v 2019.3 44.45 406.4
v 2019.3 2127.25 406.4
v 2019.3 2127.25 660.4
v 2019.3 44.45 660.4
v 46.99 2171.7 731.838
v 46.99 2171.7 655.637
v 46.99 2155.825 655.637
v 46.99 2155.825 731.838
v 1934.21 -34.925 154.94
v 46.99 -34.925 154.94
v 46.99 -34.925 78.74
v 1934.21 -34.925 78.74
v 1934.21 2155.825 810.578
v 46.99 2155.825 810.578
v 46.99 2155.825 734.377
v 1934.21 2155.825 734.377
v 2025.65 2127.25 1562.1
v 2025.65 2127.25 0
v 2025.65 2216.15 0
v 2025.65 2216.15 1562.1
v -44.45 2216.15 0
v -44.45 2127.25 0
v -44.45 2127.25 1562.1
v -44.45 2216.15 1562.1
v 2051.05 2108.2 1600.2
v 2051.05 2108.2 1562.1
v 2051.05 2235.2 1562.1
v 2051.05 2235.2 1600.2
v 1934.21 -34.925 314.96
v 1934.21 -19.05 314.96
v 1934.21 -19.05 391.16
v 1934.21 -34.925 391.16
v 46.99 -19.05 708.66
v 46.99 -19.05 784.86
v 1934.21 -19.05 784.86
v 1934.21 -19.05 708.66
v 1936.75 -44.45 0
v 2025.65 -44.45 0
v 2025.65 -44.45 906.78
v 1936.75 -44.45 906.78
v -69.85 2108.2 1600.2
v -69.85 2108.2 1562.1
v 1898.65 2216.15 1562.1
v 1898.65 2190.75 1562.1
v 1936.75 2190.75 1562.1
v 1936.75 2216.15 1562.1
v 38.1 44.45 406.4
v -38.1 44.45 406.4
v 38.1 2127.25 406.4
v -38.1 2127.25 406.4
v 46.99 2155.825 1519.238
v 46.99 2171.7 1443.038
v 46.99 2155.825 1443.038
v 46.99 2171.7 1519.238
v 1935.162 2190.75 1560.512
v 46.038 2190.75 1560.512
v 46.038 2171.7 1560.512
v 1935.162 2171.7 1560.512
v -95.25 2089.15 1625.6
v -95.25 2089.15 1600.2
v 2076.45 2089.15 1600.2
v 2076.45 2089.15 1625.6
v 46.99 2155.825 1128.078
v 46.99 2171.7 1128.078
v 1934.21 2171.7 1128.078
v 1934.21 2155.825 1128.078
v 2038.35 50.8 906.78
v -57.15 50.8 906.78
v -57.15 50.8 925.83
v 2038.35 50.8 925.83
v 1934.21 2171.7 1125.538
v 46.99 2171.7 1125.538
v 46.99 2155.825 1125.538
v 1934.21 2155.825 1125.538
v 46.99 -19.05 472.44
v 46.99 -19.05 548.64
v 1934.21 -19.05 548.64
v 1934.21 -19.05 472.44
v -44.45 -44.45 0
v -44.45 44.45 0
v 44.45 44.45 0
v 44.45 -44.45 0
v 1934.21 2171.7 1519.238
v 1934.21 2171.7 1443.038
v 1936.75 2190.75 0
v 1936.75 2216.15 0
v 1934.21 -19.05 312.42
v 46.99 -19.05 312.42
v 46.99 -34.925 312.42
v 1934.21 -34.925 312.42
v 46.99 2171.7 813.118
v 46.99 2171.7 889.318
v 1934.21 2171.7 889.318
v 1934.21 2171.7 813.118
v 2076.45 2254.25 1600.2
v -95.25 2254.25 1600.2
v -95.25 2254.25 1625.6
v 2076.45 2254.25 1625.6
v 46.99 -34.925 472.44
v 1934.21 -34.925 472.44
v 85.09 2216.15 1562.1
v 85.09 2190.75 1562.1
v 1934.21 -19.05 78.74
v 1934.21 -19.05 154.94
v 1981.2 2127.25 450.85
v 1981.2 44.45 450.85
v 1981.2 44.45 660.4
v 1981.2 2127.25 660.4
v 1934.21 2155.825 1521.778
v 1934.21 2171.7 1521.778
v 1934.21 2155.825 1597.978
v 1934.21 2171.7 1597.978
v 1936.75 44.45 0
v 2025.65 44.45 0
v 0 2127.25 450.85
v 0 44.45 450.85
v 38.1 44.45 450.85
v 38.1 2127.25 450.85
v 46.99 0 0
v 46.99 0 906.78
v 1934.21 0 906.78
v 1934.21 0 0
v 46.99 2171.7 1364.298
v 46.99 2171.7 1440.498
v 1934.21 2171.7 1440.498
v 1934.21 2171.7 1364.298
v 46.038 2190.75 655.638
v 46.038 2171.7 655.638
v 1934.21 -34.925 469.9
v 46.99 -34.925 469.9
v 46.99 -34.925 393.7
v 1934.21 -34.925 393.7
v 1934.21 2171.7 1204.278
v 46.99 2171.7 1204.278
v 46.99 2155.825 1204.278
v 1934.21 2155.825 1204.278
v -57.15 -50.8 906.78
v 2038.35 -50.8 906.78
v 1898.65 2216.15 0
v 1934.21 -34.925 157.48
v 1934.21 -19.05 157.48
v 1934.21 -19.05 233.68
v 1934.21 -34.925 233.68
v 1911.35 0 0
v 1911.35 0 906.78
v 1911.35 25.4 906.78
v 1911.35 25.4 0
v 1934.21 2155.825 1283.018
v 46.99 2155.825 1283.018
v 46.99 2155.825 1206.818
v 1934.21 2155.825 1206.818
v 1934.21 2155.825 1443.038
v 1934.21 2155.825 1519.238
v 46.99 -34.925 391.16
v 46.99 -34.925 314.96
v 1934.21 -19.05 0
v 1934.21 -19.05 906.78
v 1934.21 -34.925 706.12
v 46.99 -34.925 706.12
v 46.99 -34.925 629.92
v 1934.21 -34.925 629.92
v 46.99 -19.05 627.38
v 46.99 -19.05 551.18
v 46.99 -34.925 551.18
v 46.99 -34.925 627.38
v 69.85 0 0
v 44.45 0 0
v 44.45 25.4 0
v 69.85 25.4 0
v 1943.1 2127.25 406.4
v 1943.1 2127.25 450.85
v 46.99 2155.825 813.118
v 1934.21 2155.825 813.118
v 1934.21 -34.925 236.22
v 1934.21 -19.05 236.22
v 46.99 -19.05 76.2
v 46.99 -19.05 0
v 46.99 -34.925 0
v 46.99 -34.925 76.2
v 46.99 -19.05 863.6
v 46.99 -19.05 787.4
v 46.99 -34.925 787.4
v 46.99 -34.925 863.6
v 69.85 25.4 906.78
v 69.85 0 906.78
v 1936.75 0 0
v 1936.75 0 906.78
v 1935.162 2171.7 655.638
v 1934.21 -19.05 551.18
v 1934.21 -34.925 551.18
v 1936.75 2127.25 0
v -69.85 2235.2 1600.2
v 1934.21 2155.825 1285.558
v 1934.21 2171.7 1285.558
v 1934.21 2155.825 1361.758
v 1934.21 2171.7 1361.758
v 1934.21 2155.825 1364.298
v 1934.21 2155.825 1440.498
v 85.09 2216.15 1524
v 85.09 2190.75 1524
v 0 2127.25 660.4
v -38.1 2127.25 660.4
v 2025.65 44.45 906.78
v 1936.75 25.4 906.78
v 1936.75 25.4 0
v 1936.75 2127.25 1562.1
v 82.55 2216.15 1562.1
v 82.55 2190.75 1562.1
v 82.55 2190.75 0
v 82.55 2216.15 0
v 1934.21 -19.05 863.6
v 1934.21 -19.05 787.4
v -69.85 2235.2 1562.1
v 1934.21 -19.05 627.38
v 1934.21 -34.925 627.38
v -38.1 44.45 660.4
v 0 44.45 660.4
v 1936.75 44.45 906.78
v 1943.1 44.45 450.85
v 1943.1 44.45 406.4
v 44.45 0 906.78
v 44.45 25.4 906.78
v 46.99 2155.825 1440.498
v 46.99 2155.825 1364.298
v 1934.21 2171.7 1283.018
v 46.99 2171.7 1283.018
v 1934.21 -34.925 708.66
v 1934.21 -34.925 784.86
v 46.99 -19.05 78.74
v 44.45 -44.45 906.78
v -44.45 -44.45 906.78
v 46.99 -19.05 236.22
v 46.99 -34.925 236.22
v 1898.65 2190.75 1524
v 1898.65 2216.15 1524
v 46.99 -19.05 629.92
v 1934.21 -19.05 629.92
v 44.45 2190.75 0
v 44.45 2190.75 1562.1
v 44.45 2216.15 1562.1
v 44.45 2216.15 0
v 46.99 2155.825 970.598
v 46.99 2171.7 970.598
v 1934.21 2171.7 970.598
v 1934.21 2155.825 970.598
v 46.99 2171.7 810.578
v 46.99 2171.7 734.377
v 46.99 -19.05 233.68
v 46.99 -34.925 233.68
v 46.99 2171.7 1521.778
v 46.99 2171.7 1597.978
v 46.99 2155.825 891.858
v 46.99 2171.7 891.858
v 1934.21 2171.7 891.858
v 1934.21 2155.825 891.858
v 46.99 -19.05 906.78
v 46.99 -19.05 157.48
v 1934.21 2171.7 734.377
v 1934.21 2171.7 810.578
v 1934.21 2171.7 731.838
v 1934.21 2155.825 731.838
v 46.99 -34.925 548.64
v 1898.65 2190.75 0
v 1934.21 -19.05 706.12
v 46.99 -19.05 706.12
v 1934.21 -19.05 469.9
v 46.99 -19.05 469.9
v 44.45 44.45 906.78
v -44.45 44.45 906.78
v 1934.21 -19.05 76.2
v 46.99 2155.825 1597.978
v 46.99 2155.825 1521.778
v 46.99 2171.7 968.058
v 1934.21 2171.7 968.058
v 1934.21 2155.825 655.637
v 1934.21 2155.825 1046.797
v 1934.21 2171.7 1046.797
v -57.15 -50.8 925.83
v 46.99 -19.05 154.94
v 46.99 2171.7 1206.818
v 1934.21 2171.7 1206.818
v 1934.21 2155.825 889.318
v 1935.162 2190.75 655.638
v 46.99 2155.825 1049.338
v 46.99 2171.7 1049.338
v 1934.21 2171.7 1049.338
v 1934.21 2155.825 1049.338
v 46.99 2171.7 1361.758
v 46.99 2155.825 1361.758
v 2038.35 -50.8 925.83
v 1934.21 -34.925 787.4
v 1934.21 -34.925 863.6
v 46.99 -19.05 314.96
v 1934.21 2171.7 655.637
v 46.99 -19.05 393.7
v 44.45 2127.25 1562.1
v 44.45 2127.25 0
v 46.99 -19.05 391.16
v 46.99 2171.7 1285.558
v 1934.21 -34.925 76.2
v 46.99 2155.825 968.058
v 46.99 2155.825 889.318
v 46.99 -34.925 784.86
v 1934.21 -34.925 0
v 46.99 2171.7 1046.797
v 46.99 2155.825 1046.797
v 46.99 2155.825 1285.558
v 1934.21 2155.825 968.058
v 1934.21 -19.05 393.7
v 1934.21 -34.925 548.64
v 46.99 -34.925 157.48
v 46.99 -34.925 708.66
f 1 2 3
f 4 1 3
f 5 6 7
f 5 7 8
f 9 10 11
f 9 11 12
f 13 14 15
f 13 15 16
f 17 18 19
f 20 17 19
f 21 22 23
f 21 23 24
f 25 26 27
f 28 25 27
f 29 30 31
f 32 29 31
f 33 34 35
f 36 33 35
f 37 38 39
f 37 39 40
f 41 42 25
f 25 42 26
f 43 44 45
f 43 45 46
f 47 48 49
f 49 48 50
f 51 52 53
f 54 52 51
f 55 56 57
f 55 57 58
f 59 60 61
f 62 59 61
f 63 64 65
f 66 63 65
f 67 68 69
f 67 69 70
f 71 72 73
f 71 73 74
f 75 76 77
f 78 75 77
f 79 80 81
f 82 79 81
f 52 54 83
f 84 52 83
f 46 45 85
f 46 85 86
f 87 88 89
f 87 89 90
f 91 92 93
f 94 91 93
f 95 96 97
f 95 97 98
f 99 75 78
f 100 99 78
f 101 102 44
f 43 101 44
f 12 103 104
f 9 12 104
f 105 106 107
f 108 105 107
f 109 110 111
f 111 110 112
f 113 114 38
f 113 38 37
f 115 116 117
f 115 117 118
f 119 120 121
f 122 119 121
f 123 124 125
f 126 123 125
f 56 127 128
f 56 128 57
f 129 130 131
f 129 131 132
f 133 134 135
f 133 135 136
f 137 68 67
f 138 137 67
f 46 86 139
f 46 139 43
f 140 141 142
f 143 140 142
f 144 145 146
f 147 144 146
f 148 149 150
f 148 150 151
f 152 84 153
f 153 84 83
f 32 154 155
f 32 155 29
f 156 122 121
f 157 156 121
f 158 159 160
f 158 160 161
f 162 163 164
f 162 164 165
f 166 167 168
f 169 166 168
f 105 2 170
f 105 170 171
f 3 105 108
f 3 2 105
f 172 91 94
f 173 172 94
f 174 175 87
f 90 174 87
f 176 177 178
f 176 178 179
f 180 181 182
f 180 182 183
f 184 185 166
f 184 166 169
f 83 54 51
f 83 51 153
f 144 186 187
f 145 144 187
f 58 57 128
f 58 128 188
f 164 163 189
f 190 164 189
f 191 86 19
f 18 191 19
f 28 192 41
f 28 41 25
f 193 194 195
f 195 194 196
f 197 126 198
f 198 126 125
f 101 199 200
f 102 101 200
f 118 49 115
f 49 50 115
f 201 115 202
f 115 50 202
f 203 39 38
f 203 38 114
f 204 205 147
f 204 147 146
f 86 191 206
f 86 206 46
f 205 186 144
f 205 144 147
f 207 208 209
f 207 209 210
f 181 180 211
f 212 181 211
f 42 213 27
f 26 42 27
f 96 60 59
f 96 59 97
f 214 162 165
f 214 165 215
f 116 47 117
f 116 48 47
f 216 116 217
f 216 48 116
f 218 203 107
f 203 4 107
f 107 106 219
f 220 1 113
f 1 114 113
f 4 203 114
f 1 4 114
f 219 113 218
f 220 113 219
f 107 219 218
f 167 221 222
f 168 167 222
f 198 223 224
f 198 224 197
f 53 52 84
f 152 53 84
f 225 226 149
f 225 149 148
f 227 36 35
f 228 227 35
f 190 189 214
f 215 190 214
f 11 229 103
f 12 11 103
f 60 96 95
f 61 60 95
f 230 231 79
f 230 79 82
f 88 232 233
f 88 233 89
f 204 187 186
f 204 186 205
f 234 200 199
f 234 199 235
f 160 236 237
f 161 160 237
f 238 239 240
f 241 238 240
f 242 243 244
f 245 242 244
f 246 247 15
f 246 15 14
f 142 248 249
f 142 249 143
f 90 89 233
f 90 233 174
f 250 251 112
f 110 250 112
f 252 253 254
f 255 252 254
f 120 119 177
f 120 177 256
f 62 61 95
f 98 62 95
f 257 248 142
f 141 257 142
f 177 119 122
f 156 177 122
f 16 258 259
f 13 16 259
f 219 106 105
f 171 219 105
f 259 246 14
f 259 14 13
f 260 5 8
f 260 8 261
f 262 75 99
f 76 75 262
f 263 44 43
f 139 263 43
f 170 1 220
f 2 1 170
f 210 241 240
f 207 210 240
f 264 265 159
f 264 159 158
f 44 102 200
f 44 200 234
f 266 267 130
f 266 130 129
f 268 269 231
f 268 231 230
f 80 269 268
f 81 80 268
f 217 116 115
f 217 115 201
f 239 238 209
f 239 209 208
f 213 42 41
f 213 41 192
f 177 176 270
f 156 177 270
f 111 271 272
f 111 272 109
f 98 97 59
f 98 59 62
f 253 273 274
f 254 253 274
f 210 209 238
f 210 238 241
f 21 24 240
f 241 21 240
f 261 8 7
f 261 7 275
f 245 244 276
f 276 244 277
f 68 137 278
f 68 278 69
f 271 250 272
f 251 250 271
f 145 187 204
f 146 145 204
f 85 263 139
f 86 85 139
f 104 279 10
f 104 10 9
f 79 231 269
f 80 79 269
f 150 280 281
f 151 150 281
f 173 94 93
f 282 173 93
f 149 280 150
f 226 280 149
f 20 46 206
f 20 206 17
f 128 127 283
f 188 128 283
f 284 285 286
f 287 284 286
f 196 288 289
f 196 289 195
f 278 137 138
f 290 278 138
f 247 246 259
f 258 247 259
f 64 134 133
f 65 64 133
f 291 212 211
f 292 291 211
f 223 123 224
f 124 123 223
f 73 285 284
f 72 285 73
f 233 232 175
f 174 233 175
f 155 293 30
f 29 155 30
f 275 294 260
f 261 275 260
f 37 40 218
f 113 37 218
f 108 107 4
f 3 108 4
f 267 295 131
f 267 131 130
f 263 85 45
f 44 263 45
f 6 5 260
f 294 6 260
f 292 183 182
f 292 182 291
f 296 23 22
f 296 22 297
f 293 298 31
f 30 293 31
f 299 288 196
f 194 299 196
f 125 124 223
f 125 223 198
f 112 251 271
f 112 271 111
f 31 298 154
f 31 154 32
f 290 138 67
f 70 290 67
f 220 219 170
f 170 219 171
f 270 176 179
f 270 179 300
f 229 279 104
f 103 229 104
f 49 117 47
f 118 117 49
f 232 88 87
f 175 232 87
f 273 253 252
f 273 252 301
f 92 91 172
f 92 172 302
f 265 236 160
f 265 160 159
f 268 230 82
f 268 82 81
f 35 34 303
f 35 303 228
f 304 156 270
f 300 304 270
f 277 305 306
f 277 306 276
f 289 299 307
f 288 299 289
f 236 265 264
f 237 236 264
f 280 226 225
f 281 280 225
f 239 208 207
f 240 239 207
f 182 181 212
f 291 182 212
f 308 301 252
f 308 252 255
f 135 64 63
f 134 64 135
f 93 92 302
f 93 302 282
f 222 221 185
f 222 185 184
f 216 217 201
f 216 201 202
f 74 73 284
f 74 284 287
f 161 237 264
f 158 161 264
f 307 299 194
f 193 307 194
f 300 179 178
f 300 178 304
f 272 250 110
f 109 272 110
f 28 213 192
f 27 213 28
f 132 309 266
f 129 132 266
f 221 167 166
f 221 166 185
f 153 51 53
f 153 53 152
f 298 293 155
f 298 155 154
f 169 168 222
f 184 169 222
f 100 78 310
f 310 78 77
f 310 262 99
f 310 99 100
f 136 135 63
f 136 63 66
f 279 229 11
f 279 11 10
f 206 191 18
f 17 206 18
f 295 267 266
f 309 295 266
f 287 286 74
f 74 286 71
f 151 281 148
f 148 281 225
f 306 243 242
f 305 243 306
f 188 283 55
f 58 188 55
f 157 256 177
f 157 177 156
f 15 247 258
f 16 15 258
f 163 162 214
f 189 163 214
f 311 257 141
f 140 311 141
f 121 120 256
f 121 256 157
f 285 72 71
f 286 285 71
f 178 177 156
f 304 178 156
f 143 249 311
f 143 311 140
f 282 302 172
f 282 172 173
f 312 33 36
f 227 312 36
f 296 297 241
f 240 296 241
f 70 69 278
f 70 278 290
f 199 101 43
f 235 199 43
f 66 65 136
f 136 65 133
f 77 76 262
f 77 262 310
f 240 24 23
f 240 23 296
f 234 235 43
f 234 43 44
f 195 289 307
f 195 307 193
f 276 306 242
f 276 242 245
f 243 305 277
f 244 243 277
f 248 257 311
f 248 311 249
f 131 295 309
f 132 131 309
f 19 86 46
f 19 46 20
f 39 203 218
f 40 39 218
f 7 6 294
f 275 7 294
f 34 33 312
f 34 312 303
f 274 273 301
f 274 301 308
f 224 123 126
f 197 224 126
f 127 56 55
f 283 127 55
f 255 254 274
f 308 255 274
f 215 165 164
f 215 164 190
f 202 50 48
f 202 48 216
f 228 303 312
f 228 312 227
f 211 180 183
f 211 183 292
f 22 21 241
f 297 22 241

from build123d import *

# Parameters (mm, degrees)
F0_W      = 88.9
F0_H      = 88.9
F1_DEPTH  = 906.78
F2_W      = 25.4
F2_H      = 906.78
F3_DEPTH  = 25.4
F6_W      = 2095.5
F6_H      = 101.6
F7_DEPTH  = 19.05
F8_W      = 1887.22
F8_H      = 906.78
F9_DEPTH  = 19.05
F10_W     = 1887.22
F10_H     = 76.2
F11_DEPTH = 15.875
F12_W     = 38.1
F12_H     = 254
F13_DEPTH = 2082.8
F14_W     = 2082.8
F14_H     = 44.45
F15_DEPTH = 38.1
F17_W     = 88.9
F17_H     = 88.9
F18_DEPTH = 1562.1
F19_W     = 25.4
F19_H     = 1562.1
F20_DEPTH = 38.1
F22_W     = 2120.9
F22_H     = 127
F23_DEPTH = 38.1
F24_W     = 1813.56
F24_H     = 25.4
F25_DEPTH = 38.1
F26_W     = 1889.125
F26_H     = 904.875
F27_DEPTH = 19.05
F28_W     = 1887.22
F28_H     = 76.2
F29_DEPTH = 15.875
F30_W     = 2171.7
F30_H     = 165.1
F31_DEPTH = 25.4


with BuildPart() as f1:
    # F0 (on Top) → F1 (new body)
    with BuildSketch(Plane.XY):
        Rectangle(F0_W, F0_H)
    extrude(amount=F1_DEPTH)


with BuildPart() as f3:
    # F2 (on face) → F3 (new body)
    with BuildSketch(Plane.YZ.offset(44.45)):
        with Locations((12.7, 453.39)):
            Rectangle(F2_W, F2_H)
    extrude(amount=F3_DEPTH)


with BuildPart() as f5_1:
    # F5: instance of F1
    add(f1.part.mirror(Plane.YZ.offset(990.6)))



with BuildPart() as f5_2:
    # F5: instance of F3
    add(f3.part.mirror(Plane.YZ.offset(990.6)))


with BuildPart() as f7:
    # F6 (on face) → F7 (new body)
    with BuildSketch(Plane.XY.offset(906.78)):
        with Locations((990.6, 0)):
            Rectangle(F6_W, F6_H)
    extrude(amount=F7_DEPTH)


with BuildPart() as f9:
    # F8 (on face) → F9 (new body)
    with BuildSketch(Plane.XZ):
        with Locations((990.6, 453.39)):
            Rectangle(F8_W, F8_H)
    extrude(amount=F9_DEPTH)


with BuildPart() as f11:
    # F10 (on face) → F11 (new body)
    with BuildSketch(Plane.XZ.offset(19.05)):
        with Locations((990.6, 38.1)):
            Rectangle(F10_W, F10_H)
    extrude(amount=F11_DEPTH)


with BuildPart() as f11b:
    # F10 (on face) → F11, piece 2 (new body)
    with BuildSketch(Plane.XZ.offset(19.05)):
        with Locations((990.6, 116.84)):
            Rectangle(F10_W, F10_H)
    extrude(amount=F11_DEPTH)


with BuildPart() as f11c:
    # F10 (on face) → F11, piece 3 (new body)
    with BuildSketch(Plane.XZ.offset(19.05)):
        with Locations((990.6, 195.58)):
            Rectangle(F10_W, F10_H)
    extrude(amount=F11_DEPTH)


with BuildPart() as f11d:
    # F10 (on face) → F11, piece 4 (new body)
    with BuildSketch(Plane.XZ.offset(19.05)):
        with Locations((990.6, 274.32)):
            Rectangle(F10_W, F10_H)
    extrude(amount=F11_DEPTH)


with BuildPart() as f11e:
    # F10 (on face) → F11, piece 5 (new body)
    with BuildSketch(Plane.XZ.offset(19.05)):
        with Locations((990.6, 353.06)):
            Rectangle(F10_W, F10_H)
    extrude(amount=F11_DEPTH)


with BuildPart() as f11f:
    # F10 (on face) → F11, piece 6 (new body)
    with BuildSketch(Plane.XZ.offset(19.05)):
        with Locations((990.6, 431.8)):
            Rectangle(F10_W, F10_H)
    extrude(amount=F11_DEPTH)


with BuildPart() as f11g:
    # F10 (on face) → F11, piece 7 (new body)
    with BuildSketch(Plane.XZ.offset(19.05)):
        with Locations((990.6, 510.54)):
            Rectangle(F10_W, F10_H)
    extrude(amount=F11_DEPTH)


with BuildPart() as f11h:
    # F10 (on face) → F11, piece 8 (new body)
    with BuildSketch(Plane.XZ.offset(19.05)):
        with Locations((990.6, 589.28)):
            Rectangle(F10_W, F10_H)
    extrude(amount=F11_DEPTH)


with BuildPart() as f11i:
    # F10 (on face) → F11, piece 9 (new body)
    with BuildSketch(Plane.XZ.offset(19.05)):
        with Locations((990.6, 668.02)):
            Rectangle(F10_W, F10_H)
    extrude(amount=F11_DEPTH)


with BuildPart() as f11j:
    # F10 (on face) → F11, piece 10 (new body)
    with BuildSketch(Plane.XZ.offset(19.05)):
        with Locations((990.6, 746.76)):
            Rectangle(F10_W, F10_H)
    extrude(amount=F11_DEPTH)


with BuildPart() as f11k:
    # F10 (on face) → F11, piece 11 (new body)
    with BuildSketch(Plane.XZ.offset(19.05)):
        with Locations((990.6, 825.5)):
            Rectangle(F10_W, F10_H)
    extrude(amount=F11_DEPTH)


with BuildPart() as f13:
    # F12 (on face) → F13 (new body)
    with BuildSketch(Plane(origin=(0, 44.45, 0), x_dir=(-1, 0, 0), z_dir=(0, 1, 0))):
        with Locations((19.05, 533.4)):
            Rectangle(F12_W, F12_H)
    extrude(amount=F13_DEPTH)


with BuildPart() as f15:
    # F14 (on face) → F15 (new body)
    with BuildSketch(Plane.YZ):
        with Locations((1085.85, 428.625)):
            Rectangle(F14_W, F14_H)
    extrude(amount=F15_DEPTH)


with BuildPart() as f5_1_1:
    add(f5_1.part)

    add(f13.part)  # F16 merges F13

    add(f15.part)  # F16 merges F15
    # F16: F13, F15 across plane
    add(f13.part.mirror(Plane.YZ.offset(990.6)))
    add(f15.part.mirror(Plane.YZ.offset(990.6)))


with BuildPart() as f18:
    # F17 (on Top) → F18 (new body)
    with BuildSketch(Plane.XY):
        with Locations((0, 2171.7)):
            Rectangle(F17_W, F17_H)
    extrude(amount=F18_DEPTH)


with BuildPart() as f18b:
    # F17 (on Top) → F18, piece 2 (new body)
    with BuildSketch(Plane.XY):
        with Locations((1981.2, 2171.7)):
            Rectangle(F17_W, F17_H)
    extrude(amount=F18_DEPTH)


with BuildPart() as f20:
    # F19 (on face) → F20 (new body)
    with BuildSketch(Plane.YZ.offset(44.45)):
        with Locations((2203.45, 781.05)):
            Rectangle(F19_W, F19_H)
    extrude(amount=F20_DEPTH)


with BuildPart() as f21_1:
    # F21: instance of F20
    add(f20.part.mirror(Plane.YZ.offset(990.6)))


with BuildPart() as f23:
    # F22 (on face) → F23 (new body)
    with BuildSketch(Plane.XY.offset(1562.1)):
        with Locations((990.6, 2171.7)):
            Rectangle(F22_W, F22_H)
    extrude(amount=F23_DEPTH)


with BuildPart() as f25:
    # F24 (on face) → F25 (new body)
    with BuildSketch(Plane(origin=(0, 0, 1562.1), x_dir=(1, 0, 0), z_dir=(0, 0, -1))):
        with Locations((991.87, -2203.45)):
            Rectangle(F24_W, F24_H)
    extrude(amount=F25_DEPTH)


with BuildPart() as f27:
    # F26 (on face) → F27 (new body)
    with BuildSketch(Plane.XZ.offset(-2190.75)):
        with Locations((990.6, 1108.075)):
            Rectangle(F26_W, F26_H)
    extrude(amount=F27_DEPTH)


with BuildPart() as f29:
    # F28 (on face) → F29 (new body)
    with BuildSketch(Plane.XZ.offset(-2171.7)):
        with Locations((990.6, 693.7375)):
            Rectangle(F28_W, F28_H)
    extrude(amount=F29_DEPTH)


with BuildPart() as f29b:
    # F28 (on face) → F29, piece 2 (new body)
    with BuildSketch(Plane.XZ.offset(-2171.7)):
        with Locations((990.6, 772.4775)):
            Rectangle(F28_W, F28_H)
    extrude(amount=F29_DEPTH)


with BuildPart() as f29c:
    # F28 (on face) → F29, piece 3 (new body)
    with BuildSketch(Plane.XZ.offset(-2171.7)):
        with Locations((990.6, 851.2175)):
            Rectangle(F28_W, F28_H)
    extrude(amount=F29_DEPTH)


with BuildPart() as f29d:
    # F28 (on face) → F29, piece 4 (new body)
    with BuildSketch(Plane.XZ.offset(-2171.7)):
        with Locations((990.6, 929.9575)):
            Rectangle(F28_W, F28_H)
    extrude(amount=F29_DEPTH)


with BuildPart() as f29e:
    # F28 (on face) → F29, piece 5 (new body)
    with BuildSketch(Plane.XZ.offset(-2171.7)):
        with Locations((990.6, 1008.6975)):
            Rectangle(F28_W, F28_H)
    extrude(amount=F29_DEPTH)


with BuildPart() as f29f:
    # F28 (on face) → F29, piece 6 (new body)
    with BuildSketch(Plane.XZ.offset(-2171.7)):
        with Locations((990.6, 1087.4375)):
            Rectangle(F28_W, F28_H)
    extrude(amount=F29_DEPTH)


with BuildPart() as f29g:
    # F28 (on face) → F29, piece 7 (new body)
    with BuildSketch(Plane.XZ.offset(-2171.7)):
        with Locations((990.6, 1166.1775)):
            Rectangle(F28_W, F28_H)
    extrude(amount=F29_DEPTH)


with BuildPart() as f29h:
    # F28 (on face) → F29, piece 8 (new body)
    with BuildSketch(Plane.XZ.offset(-2171.7)):
        with Locations((990.6, 1244.9175)):
            Rectangle(F28_W, F28_H)
    extrude(amount=F29_DEPTH)


with BuildPart() as f29i:
    # F28 (on face) → F29, piece 9 (new body)
    with BuildSketch(Plane.XZ.offset(-2171.7)):
        with Locations((990.6, 1323.6575)):
            Rectangle(F28_W, F28_H)
    extrude(amount=F29_DEPTH)


with BuildPart() as f29j:
    # F28 (on face) → F29, piece 10 (new body)
    with BuildSketch(Plane.XZ.offset(-2171.7)):
        with Locations((990.6, 1402.3975)):
            Rectangle(F28_W, F28_H)
    extrude(amount=F29_DEPTH)


with BuildPart() as f29k:
    # F28 (on face) → F29, piece 11 (new body)
    with BuildSketch(Plane.XZ.offset(-2171.7)):
        with Locations((990.6, 1481.1375)):
            Rectangle(F28_W, F28_H)
    extrude(amount=F29_DEPTH)


with BuildPart() as f29l:
    # F28 (on face) → F29, piece 12 (new body)
    with BuildSketch(Plane.XZ.offset(-2171.7)):
        with Locations((990.6, 1559.8775)):
            Rectangle(F28_W, F28_H)
    extrude(amount=F29_DEPTH)


with BuildPart() as f31:
    # F30 (on face) → F31 (new body)
    with BuildSketch(Plane.XY.offset(1600.2)):
        with Locations((990.6, 2171.7)):
            Rectangle(F30_W, F30_H)
    extrude(amount=F31_DEPTH)


solid = Compound([f1.part, f3.part, f5_2.part, f7.part, f9.part, f11.part, f11b.part, f11c.part, f11d.part, f11e.part, f11f.part, f11g.part, f11h.part, f11i.part, f11j.part, f11k.part, f5_1_1.part, f18.part, f18b.part, f20.part, f21_1.part, f23.part, f25.part, f27.part, f29.part, f29b.part, f29c.part, f29d.part, f29e.part, f29f.part, f29g.part, f29h.part, f29i.part, f29j.part, f29k.part, f29l.part, f31.part])
